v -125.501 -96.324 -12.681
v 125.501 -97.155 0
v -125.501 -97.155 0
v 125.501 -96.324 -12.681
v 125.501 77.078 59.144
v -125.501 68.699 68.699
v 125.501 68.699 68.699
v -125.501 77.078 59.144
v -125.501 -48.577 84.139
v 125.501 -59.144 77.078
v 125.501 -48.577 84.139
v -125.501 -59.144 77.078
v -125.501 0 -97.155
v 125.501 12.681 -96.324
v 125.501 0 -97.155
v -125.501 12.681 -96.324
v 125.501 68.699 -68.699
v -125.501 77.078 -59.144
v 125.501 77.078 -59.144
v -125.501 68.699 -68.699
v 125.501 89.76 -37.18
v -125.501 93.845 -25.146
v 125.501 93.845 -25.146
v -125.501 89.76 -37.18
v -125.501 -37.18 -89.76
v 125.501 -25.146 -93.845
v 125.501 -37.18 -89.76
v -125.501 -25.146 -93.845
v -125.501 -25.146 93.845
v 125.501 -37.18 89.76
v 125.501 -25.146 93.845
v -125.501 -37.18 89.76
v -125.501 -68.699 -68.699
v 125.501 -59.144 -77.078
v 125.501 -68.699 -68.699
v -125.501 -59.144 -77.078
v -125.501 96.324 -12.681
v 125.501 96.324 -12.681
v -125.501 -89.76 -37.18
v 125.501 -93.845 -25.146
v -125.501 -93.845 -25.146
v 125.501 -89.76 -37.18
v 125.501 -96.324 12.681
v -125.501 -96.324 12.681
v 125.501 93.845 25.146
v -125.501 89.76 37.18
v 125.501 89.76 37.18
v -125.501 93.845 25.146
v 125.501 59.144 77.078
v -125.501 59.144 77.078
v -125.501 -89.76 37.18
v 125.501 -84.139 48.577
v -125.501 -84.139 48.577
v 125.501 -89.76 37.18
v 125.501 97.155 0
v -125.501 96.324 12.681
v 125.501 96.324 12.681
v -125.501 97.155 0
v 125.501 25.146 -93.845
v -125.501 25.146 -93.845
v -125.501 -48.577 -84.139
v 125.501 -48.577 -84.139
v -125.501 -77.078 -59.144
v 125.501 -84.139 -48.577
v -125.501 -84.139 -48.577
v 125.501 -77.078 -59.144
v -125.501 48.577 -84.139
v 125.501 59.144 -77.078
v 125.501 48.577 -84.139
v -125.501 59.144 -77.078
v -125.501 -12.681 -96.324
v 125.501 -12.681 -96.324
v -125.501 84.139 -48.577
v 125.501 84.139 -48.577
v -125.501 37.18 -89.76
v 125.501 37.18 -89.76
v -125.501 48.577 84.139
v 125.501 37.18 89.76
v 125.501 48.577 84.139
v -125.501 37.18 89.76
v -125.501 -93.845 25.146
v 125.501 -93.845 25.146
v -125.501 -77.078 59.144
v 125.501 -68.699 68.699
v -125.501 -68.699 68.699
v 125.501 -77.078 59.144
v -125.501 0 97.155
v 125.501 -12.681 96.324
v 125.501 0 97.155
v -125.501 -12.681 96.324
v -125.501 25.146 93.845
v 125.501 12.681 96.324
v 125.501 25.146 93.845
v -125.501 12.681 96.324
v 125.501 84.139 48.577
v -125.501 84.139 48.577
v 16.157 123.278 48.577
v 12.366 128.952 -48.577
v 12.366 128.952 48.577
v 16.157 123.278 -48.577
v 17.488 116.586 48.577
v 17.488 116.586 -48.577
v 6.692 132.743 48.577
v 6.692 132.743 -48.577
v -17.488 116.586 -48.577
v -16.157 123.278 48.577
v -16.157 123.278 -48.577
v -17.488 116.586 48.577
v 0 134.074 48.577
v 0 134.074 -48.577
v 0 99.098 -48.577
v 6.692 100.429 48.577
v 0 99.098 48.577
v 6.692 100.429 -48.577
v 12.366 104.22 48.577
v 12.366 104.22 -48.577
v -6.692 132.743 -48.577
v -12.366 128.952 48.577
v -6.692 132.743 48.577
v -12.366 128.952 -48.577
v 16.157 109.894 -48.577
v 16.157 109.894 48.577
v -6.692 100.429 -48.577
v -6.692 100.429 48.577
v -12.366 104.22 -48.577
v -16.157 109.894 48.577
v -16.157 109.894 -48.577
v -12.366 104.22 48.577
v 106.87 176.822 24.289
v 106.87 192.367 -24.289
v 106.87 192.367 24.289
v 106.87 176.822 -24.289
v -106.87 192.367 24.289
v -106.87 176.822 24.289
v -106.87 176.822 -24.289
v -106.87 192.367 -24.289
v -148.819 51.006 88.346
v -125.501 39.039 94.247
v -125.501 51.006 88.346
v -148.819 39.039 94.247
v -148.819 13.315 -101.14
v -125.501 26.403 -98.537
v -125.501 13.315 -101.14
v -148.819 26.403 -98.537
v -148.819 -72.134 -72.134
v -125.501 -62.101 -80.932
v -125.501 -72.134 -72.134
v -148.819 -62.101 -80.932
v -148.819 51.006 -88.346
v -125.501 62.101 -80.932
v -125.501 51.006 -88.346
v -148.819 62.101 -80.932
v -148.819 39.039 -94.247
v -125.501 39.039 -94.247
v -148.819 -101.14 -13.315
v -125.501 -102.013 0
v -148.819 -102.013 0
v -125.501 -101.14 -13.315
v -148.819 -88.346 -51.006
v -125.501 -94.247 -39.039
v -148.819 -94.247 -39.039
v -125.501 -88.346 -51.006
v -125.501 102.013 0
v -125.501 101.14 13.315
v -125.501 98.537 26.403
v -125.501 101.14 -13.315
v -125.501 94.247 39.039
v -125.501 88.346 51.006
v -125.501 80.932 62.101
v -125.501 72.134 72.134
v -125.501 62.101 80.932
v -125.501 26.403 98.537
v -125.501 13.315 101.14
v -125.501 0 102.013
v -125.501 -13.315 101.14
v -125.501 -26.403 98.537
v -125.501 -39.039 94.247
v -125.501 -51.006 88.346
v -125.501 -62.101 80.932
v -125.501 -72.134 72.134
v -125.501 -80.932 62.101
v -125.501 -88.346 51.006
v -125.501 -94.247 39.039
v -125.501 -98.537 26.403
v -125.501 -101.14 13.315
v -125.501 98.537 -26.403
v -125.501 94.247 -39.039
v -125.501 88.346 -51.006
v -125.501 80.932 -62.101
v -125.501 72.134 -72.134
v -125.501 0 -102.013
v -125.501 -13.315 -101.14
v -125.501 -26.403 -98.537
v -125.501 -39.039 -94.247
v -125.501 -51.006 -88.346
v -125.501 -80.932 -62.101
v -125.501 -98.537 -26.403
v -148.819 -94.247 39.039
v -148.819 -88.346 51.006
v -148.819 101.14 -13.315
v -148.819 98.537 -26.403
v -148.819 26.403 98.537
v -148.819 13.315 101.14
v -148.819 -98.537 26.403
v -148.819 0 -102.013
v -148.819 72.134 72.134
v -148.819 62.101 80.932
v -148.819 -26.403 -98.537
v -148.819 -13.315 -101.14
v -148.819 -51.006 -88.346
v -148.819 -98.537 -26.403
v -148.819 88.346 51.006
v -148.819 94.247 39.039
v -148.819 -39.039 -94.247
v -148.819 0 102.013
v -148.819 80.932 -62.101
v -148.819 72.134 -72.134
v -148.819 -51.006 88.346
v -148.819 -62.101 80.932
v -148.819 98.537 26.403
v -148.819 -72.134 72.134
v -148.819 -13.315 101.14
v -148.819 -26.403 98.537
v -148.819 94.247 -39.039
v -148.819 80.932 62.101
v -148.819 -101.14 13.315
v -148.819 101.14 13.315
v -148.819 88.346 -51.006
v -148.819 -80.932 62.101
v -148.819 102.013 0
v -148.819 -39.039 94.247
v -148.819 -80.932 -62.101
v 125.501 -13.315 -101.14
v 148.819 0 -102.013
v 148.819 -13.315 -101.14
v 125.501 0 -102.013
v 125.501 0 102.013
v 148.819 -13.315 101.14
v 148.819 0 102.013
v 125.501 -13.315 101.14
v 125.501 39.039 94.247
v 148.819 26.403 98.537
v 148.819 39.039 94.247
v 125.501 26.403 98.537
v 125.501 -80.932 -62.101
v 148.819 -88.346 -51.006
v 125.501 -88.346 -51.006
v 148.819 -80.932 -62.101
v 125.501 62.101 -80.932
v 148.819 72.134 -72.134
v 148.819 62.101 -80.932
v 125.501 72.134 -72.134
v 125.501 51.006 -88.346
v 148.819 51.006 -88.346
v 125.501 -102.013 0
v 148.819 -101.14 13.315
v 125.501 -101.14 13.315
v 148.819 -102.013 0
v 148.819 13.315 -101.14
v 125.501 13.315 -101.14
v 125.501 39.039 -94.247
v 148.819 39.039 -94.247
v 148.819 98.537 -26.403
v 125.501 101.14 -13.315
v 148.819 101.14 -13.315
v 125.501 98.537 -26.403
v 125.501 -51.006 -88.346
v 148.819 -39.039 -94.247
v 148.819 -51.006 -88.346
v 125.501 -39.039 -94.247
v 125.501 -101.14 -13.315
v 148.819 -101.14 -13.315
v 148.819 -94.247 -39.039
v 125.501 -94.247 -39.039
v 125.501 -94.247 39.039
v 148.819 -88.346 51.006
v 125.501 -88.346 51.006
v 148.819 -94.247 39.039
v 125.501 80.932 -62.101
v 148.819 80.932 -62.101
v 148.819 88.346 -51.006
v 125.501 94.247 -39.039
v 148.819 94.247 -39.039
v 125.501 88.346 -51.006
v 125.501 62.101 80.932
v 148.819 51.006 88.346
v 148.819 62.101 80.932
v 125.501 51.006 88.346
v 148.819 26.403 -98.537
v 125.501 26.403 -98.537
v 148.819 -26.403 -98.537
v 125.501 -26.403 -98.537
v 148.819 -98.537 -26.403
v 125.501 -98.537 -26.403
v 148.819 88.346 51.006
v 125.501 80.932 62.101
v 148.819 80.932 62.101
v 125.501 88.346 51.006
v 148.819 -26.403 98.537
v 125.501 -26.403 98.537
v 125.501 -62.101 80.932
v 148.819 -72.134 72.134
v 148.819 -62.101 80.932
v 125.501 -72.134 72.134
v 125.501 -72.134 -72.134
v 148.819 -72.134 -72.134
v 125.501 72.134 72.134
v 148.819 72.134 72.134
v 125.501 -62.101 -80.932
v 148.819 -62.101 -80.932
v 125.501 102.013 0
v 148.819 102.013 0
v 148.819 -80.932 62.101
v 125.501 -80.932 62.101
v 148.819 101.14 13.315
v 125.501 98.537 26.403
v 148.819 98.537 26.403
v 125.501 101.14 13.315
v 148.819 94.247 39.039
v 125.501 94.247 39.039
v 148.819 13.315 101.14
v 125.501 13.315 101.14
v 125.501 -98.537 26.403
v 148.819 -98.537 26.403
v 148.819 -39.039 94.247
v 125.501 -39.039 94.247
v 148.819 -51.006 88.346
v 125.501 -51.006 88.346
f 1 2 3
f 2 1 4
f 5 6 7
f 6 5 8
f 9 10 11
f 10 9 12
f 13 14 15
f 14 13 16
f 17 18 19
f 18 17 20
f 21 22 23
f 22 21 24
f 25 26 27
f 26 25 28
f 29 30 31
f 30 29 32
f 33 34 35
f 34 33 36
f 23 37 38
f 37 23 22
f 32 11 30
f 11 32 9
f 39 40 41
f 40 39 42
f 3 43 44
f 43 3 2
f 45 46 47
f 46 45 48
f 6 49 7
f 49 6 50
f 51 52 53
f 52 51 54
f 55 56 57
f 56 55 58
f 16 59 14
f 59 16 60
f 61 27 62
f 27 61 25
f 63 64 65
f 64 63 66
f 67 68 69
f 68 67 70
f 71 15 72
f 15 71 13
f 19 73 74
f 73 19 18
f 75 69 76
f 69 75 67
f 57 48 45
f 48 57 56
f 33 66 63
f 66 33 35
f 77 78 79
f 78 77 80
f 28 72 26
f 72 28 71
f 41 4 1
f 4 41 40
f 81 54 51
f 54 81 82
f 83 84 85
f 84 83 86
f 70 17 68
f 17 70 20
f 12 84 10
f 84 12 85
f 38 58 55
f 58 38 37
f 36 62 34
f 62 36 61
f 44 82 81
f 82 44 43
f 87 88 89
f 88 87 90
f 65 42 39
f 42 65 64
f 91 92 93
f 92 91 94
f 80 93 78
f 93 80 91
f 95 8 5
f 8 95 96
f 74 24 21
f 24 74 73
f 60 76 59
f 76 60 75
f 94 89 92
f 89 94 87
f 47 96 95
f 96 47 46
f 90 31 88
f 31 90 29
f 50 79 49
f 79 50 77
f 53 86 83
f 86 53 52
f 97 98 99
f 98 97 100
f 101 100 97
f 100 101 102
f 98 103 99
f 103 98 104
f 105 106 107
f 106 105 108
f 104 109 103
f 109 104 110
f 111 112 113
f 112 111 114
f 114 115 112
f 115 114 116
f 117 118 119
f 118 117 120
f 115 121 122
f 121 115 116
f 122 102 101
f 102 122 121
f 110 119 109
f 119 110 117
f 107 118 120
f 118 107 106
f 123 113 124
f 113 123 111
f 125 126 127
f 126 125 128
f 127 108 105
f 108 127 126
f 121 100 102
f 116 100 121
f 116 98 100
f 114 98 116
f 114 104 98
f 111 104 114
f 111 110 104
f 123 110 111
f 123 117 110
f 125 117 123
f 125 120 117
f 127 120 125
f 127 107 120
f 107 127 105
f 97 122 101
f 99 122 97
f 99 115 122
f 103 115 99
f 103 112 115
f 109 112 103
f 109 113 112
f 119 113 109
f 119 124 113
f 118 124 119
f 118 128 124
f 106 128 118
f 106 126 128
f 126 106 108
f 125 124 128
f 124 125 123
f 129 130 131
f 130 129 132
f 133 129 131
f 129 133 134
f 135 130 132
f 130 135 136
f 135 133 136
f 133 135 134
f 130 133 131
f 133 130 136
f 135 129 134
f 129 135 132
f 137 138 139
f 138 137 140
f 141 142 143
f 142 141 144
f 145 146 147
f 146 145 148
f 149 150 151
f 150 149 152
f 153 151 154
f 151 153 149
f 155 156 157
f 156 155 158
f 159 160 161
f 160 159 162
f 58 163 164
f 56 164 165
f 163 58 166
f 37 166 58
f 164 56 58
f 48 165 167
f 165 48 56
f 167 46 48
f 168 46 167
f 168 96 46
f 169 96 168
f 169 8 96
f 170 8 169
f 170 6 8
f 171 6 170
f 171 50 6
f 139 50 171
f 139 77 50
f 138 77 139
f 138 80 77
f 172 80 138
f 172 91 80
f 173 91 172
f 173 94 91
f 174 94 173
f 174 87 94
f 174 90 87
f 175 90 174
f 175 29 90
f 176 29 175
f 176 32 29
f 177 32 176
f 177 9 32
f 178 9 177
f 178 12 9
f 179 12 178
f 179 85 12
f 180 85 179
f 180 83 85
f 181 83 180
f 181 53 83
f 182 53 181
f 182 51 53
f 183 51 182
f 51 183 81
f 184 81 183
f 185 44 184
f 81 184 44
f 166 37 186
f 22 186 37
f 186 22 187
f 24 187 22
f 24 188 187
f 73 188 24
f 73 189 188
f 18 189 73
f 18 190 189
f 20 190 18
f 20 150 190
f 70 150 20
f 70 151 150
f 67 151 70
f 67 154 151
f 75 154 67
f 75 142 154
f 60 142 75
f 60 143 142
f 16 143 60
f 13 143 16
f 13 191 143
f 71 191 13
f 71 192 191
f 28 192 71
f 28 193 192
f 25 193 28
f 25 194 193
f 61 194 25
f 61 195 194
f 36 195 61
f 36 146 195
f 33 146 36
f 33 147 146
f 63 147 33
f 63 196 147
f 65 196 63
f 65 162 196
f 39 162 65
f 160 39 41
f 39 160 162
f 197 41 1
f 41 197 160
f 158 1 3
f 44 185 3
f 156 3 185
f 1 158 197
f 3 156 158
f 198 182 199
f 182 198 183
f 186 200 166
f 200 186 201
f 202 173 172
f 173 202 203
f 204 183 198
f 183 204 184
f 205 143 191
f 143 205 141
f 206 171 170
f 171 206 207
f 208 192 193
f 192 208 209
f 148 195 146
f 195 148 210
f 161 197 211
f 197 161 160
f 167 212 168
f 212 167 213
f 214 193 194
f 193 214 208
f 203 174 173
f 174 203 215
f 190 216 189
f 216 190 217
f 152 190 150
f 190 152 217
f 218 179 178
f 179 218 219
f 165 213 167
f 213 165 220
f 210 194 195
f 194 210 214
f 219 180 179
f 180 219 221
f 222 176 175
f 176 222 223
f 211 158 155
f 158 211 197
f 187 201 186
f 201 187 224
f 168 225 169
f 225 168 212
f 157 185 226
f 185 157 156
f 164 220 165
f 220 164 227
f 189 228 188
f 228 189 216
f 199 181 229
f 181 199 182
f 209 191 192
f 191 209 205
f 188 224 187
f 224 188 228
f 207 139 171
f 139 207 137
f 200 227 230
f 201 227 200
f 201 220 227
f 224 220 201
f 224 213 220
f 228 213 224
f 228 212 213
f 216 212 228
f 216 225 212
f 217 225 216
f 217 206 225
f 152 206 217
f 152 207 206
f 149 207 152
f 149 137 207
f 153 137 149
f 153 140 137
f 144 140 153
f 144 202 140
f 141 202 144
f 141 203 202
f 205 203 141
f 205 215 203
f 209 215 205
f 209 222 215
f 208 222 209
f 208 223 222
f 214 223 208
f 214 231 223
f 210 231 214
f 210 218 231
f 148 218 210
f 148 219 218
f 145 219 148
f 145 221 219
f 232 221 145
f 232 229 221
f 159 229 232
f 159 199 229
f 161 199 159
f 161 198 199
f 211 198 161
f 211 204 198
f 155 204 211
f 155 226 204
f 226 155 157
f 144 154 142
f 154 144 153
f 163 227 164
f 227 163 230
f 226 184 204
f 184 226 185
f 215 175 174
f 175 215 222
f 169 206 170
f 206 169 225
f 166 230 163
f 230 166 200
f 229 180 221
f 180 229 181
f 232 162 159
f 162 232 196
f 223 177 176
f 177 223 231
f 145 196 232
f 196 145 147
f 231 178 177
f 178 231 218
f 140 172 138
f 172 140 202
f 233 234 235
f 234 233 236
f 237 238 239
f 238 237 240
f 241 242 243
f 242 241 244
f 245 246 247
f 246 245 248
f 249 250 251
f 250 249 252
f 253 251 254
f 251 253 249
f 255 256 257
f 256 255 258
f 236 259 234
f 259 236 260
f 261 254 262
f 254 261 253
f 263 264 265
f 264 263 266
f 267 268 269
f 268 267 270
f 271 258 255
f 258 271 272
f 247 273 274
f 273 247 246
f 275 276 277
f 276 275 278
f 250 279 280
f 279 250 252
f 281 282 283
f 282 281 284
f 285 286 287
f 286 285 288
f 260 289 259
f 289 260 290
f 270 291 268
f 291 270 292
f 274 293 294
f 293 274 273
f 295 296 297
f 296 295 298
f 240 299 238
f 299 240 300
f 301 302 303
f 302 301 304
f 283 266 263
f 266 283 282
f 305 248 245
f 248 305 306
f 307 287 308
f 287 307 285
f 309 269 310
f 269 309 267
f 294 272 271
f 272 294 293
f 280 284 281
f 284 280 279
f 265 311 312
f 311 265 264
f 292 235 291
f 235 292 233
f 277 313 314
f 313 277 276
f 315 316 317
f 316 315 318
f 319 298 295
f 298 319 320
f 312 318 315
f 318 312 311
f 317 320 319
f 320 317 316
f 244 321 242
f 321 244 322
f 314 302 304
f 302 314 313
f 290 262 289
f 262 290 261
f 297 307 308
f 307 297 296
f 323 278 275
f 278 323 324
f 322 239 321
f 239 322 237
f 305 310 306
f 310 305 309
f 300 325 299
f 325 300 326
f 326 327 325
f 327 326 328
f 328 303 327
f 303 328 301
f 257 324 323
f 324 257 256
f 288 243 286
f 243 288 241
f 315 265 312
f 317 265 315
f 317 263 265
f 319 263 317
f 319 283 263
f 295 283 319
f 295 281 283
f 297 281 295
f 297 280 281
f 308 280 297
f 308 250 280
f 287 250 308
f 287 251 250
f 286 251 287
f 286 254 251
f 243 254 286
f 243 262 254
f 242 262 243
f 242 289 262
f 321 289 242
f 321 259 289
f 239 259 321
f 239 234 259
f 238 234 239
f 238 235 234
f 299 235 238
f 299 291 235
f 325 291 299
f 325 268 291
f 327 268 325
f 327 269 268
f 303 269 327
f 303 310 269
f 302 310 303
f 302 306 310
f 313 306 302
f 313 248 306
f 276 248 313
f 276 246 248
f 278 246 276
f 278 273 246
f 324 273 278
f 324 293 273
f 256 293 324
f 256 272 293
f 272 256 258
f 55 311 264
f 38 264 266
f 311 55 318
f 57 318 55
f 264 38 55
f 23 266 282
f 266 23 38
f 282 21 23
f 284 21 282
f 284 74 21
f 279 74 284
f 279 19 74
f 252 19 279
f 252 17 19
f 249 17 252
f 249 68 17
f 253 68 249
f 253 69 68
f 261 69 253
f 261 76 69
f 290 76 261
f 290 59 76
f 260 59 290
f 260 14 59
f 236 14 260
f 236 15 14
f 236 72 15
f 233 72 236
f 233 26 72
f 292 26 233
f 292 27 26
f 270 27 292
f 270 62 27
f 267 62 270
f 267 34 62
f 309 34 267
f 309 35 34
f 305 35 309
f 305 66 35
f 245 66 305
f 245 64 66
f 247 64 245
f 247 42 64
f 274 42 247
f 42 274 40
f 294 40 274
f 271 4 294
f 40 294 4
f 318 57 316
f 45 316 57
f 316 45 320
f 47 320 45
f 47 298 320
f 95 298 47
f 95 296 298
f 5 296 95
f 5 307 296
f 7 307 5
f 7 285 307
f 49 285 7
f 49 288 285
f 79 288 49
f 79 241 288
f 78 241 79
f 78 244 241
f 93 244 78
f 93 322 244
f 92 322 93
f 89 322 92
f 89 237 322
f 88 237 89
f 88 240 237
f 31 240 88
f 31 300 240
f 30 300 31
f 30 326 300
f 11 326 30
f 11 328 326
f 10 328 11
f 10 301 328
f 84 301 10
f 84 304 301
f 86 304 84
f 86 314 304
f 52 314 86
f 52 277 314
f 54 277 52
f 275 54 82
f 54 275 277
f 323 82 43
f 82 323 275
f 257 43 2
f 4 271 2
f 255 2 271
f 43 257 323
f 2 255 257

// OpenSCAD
// Auto-generated by scripts/author_from_manifest.py (Phase D.3).
// Source: data/phase_d_manifest.json (sku_intent='viking-f1-dry-pipe-4in').
// Do not hand-edit — regenerate from the manifest.
//
// @part viking_f1_dry_pipe_4in
// @kind valve
// @category valve.dry.pipe
// @display-name "Viking Model F-1 Dry-Pipe Valve 4\""
// @mfg viking_group
// @mfg-pn F-1
// @listing UL FM
// @price-usd 960.00
// @install-minutes 60
// @crew foreman
// @param size_in number default=4 label="Size" unit="in"
// @port inlet position=[-0.05,0,0] direction=[-1,0,0] style=grooved size_in=4 role=run_a
// @port outlet position=[0.05,0,0] direction=[1,0,0] style=grooved size_in=4 role=run_b

size_in = 4.0;

function od_mm(nps) =
    nps ==   1  ? 33.4 :
    nps == 1.25 ? 42.2 :
    nps == 1.5  ? 48.3 :
    nps ==   2  ? 60.3 :
    nps == 2.5  ? 73.0 :
    nps ==   3  ? 88.9 :
    nps ==   4  ? 114.3 :
    nps ==   6  ? 168.3 :
    nps ==   8  ? 219.1 : 73.0;

od = od_mm(size_in);
body_len = od * 2.4;
body_d   = od * 1.7;

union() {
    // Valve body
    rotate([0, 90, 0])
        cylinder(h = body_len, d = body_d, center = true, $fn = 48);
    // Stem / handle indicator
    translate([0, body_d * 0.6, 0])
        cylinder(h = body_d * 0.5, d = body_d * 0.18, center = true, $fn = 16);
    translate([0, body_d * 0.95, 0])
        cube([body_d * 1.1, body_d * 0.08, body_d * 0.25], center = true);
    // End flanges
    translate([-body_len/2, 0, 0])
        rotate([0, 90, 0])
        cylinder(h = body_d * 0.12, d = body_d * 1.05, center = true, $fn = 48);
    translate([ body_len/2, 0, 0])
        rotate([0, 90, 0])
        cylinder(h = body_d * 0.12, d = body_d * 1.05, center = true, $fn = 48);
}
